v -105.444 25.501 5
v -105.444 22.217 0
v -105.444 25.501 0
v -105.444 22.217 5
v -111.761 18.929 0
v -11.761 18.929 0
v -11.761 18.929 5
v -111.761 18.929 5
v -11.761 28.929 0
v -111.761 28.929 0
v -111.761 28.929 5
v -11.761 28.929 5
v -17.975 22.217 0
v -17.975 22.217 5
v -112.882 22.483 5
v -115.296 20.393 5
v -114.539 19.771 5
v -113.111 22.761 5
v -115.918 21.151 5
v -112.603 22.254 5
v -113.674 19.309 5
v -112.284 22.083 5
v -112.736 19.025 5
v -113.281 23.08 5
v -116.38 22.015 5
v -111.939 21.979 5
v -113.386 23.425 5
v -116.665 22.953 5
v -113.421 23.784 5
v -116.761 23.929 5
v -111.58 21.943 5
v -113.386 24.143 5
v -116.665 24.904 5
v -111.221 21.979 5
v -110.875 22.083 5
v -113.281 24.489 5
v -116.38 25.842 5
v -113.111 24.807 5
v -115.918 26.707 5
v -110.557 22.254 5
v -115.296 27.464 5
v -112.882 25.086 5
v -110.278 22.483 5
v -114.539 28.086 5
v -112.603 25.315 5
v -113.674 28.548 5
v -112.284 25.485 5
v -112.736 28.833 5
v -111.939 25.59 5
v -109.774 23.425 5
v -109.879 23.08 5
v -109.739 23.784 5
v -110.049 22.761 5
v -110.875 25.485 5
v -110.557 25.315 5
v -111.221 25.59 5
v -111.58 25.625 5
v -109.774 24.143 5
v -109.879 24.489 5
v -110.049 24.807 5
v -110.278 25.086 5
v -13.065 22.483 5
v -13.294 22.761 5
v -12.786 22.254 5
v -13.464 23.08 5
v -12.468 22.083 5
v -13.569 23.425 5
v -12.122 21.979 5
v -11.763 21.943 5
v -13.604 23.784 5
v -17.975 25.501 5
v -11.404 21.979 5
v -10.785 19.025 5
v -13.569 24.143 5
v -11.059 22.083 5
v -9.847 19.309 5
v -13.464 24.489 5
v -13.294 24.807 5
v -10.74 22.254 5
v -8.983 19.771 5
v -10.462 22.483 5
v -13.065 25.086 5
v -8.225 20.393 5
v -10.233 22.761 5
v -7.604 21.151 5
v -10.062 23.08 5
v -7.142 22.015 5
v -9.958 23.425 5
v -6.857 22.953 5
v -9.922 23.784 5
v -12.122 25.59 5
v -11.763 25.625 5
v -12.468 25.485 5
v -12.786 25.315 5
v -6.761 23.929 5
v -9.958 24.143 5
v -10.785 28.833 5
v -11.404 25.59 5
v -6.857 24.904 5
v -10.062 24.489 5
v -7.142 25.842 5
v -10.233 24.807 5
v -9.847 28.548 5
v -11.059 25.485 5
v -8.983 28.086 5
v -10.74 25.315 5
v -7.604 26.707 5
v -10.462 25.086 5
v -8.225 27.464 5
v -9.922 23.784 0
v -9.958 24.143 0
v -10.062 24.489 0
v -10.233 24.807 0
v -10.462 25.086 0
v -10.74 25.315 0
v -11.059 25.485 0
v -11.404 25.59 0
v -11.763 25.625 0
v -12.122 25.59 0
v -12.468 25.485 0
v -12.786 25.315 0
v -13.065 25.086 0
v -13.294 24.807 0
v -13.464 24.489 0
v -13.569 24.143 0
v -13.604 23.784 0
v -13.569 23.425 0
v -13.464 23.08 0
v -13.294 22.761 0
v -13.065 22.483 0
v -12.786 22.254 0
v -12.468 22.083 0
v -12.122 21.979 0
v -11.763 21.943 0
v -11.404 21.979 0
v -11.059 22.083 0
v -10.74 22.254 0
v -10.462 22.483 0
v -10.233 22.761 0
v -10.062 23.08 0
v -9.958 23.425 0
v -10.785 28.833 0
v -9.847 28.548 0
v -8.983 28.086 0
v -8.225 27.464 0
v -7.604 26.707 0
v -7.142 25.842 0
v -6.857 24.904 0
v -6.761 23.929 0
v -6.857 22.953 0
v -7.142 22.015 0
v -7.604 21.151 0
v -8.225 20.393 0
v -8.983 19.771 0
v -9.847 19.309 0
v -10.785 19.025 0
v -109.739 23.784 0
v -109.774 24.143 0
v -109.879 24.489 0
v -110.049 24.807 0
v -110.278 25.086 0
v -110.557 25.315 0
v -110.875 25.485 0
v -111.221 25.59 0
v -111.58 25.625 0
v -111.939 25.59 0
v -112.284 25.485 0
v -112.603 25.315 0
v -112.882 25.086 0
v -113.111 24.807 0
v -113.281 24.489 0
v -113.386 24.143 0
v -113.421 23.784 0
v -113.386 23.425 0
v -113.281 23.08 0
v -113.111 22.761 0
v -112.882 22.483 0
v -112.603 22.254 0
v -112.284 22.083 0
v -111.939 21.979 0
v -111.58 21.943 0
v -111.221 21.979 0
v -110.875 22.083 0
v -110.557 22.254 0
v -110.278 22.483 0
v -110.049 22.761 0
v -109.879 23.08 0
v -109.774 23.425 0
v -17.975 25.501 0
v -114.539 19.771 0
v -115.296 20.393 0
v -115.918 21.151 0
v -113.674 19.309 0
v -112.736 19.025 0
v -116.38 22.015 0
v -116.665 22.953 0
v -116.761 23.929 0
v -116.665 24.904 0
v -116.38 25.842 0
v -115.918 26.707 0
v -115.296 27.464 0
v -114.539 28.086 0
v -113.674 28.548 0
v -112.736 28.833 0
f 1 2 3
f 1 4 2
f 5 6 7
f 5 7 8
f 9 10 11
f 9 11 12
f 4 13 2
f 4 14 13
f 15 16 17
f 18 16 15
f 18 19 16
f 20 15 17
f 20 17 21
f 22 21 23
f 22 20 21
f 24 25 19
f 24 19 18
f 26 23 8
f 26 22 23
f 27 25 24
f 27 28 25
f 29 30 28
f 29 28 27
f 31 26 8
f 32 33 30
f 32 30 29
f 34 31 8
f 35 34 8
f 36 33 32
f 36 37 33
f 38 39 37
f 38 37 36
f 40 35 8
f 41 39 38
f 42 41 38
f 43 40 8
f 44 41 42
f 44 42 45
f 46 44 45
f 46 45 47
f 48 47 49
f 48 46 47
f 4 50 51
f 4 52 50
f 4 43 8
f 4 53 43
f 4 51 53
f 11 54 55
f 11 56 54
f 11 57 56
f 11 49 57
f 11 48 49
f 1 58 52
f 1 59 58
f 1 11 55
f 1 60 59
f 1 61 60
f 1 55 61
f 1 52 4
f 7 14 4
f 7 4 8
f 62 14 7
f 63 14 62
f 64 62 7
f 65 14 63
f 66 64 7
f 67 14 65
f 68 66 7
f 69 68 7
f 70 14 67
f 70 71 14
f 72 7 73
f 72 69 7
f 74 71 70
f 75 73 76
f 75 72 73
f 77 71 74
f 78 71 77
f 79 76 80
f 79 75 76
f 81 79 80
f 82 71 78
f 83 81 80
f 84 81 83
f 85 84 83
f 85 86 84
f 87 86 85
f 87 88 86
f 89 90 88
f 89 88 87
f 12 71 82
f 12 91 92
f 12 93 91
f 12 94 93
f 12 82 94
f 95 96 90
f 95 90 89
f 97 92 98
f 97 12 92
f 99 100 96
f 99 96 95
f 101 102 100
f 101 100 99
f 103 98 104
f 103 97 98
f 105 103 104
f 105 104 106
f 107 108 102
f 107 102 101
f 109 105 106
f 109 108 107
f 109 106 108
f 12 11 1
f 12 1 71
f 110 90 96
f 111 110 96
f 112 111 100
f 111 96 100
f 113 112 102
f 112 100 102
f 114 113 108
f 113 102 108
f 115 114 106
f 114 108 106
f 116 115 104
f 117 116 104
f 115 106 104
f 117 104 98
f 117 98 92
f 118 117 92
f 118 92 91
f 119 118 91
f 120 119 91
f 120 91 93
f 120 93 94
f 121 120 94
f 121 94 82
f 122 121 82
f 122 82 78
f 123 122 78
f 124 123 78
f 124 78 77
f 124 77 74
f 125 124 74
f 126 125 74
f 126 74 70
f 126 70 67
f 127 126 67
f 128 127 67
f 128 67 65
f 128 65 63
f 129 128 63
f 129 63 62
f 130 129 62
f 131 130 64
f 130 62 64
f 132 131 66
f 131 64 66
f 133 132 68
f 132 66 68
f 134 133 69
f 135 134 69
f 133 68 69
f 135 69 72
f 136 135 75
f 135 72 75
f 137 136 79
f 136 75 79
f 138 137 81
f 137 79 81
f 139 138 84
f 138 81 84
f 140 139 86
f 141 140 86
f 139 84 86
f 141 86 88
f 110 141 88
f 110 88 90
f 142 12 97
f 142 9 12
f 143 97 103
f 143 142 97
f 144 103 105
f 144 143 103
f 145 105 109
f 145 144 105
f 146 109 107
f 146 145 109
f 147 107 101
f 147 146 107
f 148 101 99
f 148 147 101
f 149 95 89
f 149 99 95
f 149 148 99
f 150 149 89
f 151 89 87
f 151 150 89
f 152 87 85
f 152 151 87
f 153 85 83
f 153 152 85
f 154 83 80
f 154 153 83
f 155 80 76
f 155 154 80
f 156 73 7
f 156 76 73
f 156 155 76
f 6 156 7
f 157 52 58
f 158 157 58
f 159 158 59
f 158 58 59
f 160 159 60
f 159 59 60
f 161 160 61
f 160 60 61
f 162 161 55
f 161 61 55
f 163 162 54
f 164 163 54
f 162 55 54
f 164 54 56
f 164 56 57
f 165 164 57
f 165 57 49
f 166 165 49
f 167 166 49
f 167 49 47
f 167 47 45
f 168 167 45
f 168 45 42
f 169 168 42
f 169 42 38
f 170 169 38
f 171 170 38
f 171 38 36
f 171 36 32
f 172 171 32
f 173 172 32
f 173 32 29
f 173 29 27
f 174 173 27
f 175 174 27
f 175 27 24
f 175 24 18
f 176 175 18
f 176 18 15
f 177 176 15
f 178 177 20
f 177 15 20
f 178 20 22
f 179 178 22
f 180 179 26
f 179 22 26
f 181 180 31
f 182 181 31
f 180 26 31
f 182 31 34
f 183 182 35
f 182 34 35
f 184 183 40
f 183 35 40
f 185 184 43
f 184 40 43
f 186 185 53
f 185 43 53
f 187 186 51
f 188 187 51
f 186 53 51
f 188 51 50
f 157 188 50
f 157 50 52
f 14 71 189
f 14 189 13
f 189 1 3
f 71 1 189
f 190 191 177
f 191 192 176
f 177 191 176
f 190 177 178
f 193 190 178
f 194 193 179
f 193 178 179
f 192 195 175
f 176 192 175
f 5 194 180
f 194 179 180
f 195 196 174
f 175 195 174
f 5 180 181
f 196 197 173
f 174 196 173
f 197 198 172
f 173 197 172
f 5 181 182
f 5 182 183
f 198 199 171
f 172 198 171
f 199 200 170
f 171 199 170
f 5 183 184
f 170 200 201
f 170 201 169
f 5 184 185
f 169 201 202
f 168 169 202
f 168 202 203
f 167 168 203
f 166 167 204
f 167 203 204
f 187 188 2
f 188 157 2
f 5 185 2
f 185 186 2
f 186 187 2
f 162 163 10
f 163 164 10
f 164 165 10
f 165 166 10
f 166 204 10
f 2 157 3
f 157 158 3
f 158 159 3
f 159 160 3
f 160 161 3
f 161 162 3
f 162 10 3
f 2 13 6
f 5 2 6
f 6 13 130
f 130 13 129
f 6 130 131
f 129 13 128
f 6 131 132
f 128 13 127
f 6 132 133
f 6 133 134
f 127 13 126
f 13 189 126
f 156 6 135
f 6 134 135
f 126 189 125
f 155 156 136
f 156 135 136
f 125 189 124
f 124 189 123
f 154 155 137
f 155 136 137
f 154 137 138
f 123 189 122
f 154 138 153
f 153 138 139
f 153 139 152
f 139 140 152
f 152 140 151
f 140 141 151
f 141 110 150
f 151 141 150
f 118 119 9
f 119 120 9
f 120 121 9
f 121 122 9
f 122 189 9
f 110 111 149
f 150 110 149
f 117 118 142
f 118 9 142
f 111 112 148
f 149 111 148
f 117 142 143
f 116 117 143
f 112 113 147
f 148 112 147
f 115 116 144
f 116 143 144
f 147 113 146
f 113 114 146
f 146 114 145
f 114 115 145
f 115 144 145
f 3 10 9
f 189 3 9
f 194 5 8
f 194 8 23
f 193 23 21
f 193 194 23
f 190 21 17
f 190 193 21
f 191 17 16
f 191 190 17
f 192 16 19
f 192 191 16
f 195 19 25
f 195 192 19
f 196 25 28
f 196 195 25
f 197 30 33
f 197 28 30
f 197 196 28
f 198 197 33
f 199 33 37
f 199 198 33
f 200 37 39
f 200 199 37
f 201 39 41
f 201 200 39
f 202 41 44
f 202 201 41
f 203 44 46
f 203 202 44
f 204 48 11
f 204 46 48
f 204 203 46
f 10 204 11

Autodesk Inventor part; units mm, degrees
ref_plane "YZ Plane" through (0, 0, 0) normal (1, 0, 0) x (0, 1, 0)
ref_plane "XZ Plane" through (0, 0, 0) normal (0, 1, 0) x (-1, 0, 0)
ref_plane "XY Plane" through (0, 0, 0) normal (0, 0, 1) x (1, 0, 0)
sketch "Sketch1" plane through (0, 0, 0) normal (0, 0, 1) x (1, 0, 0)
  line L0 (-111.7609, 28.9288) -> (-11.7609, 28.9288)
  line L1 (-11.7609, 28.9288) -> (-11.7609, 18.9288)
  line L2 (-11.7609, 18.9288) -> (-111.7609, 18.9288)
  line L3 (-111.7609, 18.9288) -> (-111.7609, 28.9288)
  arc A0 (-111.7609, 28.9288) -> (-111.7609, 18.9288) centre (-111.7609, 23.9288) ccw
  arc A1 (-11.7609, 18.9288) -> (-11.7609, 28.9288) centre (-11.7609, 23.9288) ccw
  point P0 (0, 0)
  point P1 (-105.9495, 22.4367)
extrude "Extrusion1" add sketch "Sketch1" along normal blind 5
sketch "Sketch2" plane through (0, 0, 5) normal (0, 0, 1) x (1, 0, 0)
  circle A0 centre (-11.7633, 23.7843) radius 1.841
  circle A1 centre (-111.5799, 23.7843) radius 1.841
  point P0 (0, 0)
extrude "Extrusion2" cut sketch "Sketch2" against normal blind 5
sketch "Sketch3" plane through (0, 0, 5) normal (0, 0, 1) x (1, 0, 0)
  line L0 (-105.444, 25.5006) -> (-17.9751, 25.5006)
  line L1 (-17.9751, 25.5006) -> (-17.9751, 22.2171)
  line L2 (-17.9751, 22.2171) -> (-105.444, 22.2171)
  line L3 (-105.444, 22.2171) -> (-105.444, 25.5006)
  point P0 (0, 0)
extrude "Extrusion3" cut sketch "Sketch3" against normal blind 10
properties part number "Bracket"
